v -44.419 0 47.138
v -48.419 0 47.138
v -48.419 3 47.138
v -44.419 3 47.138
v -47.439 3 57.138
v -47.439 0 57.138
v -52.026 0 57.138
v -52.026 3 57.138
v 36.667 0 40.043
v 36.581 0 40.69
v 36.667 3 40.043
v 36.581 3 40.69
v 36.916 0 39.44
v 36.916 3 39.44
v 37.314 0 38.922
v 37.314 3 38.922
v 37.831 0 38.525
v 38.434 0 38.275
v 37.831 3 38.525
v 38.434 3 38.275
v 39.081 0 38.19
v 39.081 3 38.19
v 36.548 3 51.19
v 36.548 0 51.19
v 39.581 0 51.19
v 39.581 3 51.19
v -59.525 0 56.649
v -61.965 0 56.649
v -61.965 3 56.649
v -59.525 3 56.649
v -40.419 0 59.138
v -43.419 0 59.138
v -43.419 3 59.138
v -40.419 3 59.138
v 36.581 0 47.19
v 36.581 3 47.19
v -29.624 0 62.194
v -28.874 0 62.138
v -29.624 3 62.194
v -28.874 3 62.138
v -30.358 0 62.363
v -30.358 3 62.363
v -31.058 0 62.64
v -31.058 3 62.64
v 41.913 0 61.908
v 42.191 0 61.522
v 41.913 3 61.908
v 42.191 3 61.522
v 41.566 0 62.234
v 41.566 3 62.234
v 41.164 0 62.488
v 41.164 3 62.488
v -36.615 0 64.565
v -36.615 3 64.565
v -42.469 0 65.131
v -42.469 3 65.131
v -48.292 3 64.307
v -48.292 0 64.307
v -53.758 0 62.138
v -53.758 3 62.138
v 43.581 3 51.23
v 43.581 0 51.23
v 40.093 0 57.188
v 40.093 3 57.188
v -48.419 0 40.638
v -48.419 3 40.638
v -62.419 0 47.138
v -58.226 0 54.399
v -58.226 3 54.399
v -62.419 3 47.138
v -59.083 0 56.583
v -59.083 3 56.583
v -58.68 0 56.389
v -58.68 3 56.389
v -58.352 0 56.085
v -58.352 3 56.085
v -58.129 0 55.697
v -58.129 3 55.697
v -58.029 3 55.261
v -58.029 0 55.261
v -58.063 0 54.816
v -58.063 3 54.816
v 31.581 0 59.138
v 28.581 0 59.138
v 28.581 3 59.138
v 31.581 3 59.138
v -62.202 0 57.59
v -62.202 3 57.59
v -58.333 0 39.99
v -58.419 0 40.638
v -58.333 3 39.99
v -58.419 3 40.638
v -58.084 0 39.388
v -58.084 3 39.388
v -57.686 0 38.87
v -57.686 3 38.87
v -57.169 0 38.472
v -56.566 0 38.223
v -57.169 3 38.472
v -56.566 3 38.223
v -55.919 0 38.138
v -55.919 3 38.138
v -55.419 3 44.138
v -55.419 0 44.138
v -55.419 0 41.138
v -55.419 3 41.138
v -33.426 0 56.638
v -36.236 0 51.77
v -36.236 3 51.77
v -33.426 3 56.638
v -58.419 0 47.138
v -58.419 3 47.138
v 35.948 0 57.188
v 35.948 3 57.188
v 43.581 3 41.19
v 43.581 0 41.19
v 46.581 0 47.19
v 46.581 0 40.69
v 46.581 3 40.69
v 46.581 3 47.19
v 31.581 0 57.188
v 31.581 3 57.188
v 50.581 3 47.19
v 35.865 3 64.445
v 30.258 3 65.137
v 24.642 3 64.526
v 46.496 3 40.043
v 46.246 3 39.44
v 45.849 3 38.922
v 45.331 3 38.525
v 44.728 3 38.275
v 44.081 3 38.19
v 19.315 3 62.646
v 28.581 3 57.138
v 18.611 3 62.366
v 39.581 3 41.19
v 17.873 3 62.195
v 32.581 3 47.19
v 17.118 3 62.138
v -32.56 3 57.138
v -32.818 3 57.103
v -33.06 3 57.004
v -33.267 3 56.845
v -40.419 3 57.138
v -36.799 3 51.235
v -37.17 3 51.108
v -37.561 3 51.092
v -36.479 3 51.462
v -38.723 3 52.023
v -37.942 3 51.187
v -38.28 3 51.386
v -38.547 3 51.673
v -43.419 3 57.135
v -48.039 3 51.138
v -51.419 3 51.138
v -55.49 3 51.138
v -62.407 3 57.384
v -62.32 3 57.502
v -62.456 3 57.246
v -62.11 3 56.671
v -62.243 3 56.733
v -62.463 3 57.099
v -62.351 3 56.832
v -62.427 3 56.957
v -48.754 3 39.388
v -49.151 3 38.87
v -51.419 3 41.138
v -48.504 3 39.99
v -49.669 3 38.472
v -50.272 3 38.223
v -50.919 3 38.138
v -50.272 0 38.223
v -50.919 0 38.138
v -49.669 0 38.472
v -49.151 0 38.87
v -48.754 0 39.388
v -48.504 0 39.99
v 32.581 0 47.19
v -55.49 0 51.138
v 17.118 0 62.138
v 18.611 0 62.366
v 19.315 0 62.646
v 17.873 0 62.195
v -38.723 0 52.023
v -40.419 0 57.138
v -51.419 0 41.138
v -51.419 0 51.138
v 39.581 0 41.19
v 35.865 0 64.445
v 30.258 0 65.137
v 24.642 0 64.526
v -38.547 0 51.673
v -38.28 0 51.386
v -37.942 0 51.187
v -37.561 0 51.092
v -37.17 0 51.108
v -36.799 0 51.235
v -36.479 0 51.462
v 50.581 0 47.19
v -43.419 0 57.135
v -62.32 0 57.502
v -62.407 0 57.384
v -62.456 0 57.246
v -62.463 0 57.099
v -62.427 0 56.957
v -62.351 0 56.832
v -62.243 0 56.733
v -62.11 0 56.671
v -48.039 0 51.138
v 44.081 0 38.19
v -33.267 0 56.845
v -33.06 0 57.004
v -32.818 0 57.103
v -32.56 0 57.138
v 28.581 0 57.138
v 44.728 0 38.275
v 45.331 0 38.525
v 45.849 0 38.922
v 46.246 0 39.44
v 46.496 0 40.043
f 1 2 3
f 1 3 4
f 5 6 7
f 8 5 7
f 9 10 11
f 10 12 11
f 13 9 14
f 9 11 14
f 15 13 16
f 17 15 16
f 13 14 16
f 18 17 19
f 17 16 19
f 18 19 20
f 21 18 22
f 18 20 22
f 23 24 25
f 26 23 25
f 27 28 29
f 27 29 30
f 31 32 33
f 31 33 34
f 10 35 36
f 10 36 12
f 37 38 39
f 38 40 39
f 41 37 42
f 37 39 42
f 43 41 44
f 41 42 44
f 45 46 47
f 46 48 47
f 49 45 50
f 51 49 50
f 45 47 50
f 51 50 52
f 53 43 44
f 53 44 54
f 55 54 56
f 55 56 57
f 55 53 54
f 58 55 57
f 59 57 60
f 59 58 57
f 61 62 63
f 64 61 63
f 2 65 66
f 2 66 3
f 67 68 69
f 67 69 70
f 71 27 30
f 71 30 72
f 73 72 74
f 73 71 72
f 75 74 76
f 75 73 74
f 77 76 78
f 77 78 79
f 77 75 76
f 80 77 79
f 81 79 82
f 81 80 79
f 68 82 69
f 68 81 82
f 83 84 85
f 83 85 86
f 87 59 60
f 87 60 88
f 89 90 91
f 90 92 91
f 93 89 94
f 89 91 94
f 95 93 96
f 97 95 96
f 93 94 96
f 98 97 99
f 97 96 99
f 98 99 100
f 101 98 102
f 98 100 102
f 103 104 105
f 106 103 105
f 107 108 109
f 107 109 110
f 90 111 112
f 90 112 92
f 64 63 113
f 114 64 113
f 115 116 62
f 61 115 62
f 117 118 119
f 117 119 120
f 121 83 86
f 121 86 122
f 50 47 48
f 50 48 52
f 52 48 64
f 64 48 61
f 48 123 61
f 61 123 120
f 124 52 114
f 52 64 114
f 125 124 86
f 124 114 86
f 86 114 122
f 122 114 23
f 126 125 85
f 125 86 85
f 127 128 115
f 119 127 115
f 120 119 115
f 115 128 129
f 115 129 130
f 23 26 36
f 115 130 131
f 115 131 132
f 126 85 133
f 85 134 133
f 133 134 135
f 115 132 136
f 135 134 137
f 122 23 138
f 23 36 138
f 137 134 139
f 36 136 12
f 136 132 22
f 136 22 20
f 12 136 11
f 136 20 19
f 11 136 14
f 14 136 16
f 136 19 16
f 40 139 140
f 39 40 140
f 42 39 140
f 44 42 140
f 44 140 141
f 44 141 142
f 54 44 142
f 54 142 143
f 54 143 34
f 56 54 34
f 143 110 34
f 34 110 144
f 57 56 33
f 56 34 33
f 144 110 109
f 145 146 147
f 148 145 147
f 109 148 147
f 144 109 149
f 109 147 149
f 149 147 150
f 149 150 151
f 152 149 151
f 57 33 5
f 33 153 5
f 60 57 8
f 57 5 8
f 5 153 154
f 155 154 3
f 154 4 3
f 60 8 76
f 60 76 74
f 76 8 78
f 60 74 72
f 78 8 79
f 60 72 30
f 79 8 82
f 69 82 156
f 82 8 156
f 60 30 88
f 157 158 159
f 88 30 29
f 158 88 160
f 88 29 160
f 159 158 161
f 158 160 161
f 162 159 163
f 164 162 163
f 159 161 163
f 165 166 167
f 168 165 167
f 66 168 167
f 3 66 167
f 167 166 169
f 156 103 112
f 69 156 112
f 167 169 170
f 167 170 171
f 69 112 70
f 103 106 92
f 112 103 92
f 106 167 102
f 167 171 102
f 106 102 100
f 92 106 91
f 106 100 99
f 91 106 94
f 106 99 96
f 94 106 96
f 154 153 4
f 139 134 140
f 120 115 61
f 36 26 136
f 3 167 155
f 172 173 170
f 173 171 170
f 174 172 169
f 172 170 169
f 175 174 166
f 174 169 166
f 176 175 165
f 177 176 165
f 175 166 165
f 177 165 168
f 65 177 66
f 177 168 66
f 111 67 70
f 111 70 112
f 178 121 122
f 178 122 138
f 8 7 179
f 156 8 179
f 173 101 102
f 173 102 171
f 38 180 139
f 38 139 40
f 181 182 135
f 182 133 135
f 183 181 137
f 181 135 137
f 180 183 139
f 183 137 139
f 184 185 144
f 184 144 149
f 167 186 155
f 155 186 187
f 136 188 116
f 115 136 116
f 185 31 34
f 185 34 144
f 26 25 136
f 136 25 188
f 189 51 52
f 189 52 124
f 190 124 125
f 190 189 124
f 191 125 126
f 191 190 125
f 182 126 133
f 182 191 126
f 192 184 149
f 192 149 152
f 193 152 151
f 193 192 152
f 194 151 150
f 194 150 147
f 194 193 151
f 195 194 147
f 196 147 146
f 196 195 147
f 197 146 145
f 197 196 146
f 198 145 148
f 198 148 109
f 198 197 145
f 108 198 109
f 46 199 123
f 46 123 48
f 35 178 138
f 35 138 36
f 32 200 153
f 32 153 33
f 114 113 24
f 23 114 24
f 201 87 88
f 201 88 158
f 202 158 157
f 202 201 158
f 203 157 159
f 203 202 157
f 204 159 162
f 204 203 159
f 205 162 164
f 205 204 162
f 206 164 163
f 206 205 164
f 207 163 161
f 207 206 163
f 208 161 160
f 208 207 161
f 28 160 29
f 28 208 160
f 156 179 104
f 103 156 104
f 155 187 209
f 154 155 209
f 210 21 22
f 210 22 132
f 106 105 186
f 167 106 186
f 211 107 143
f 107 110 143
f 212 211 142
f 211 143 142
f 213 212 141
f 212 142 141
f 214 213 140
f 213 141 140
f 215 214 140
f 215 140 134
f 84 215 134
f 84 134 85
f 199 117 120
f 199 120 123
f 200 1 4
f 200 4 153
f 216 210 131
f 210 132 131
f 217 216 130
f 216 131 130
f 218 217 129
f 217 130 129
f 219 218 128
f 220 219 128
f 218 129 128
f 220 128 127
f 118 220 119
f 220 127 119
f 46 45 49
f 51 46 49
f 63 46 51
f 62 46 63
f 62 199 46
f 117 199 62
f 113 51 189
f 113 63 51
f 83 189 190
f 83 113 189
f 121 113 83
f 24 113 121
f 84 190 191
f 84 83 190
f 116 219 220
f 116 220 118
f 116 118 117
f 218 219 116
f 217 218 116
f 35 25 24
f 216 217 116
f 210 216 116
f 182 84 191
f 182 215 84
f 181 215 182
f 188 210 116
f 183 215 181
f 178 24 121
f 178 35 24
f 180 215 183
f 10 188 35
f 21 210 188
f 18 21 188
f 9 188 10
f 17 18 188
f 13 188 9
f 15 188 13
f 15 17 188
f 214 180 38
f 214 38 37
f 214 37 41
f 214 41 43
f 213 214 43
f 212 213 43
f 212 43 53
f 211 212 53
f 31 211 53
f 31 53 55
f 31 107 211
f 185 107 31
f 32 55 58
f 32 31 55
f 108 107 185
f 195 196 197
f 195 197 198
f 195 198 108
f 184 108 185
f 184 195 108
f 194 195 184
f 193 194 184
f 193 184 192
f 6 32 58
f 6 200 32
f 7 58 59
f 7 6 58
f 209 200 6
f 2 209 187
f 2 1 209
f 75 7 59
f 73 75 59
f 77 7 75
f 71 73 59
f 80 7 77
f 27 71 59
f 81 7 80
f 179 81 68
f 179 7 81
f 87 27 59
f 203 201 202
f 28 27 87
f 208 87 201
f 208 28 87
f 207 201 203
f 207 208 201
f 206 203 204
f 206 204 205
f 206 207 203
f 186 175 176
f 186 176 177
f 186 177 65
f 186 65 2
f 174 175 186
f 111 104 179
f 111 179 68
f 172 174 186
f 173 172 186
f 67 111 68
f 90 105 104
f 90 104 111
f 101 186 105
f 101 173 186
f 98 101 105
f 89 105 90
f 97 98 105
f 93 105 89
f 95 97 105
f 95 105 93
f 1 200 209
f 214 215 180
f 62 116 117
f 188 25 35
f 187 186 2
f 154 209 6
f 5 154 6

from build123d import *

# Parameters (mm, degrees)
BOSS_EXTRUDE1_DEPTH = 3
FILLET2_R           = 2.5
FILLET3_R           = 1
FILLET5_R           = 2.5
FILLET6_R           = 5


with BuildPart() as part:
    # Sketch1 → Boss-Extrude1 (new body)
    with BuildSketch(Plane(origin=(0, 0, 0), x_dir=(1, 0, 0), z_dir=(0, 1, 0))):
        with BuildLine():
            Line((-62.418566214, -47.137504987), (-58.418566214, -47.137504987))
            Line((-58.418566214, -47.137504987), (-58.418566214, -38.137504987))
            Line((-58.418566214, -38.137504987), (-48.418566214, -38.137504987))
            Line((-48.418566214, -38.137504987), (-48.418566214, -47.137504987))
            Line((-48.418566214, -47.137504987), (-44.418566214, -47.137504987))
            Line((-44.418566214, -47.137504987), (-43.418817081, -57.134996312))
            Line((-43.418817081, -57.134996312), (-43.418817081, -59.137504987))
            Line((-43.418817081, -59.137504987), (-40.418817081, -59.137504987))
            Line((-40.418817081, -59.137504987), (-40.418817081, -57.137504987))
            Line((-40.418817081, -57.137504987), (-38.722684913, -52.023499684))
            ThreePointArc((-38.722684913, -52.023499684), (-37.561438496, -51.091888176), (-36.235977812, -51.769787298))
            Line((-36.235977812, -51.769787298), (-33.13692456, -57.137504987))
            Line((-33.13692456, -57.137504987), (28.581433786, -57.137504987))
            Line((28.581433786, -57.137504987), (28.581433786, -59.137504987))
            Line((28.581433786, -59.137504987), (31.581433786, -59.137504987))
            Line((31.581433786, -59.137504987), (31.581433786, -57.187643384))
            Line((31.581433786, -57.187643384), (32.581433786, -47.190177149))
            Line((32.581433786, -47.190177149), (36.581433786, -47.190177149))
            Line((36.581433786, -47.190177149), (36.581433786, -38.190177149))
            Line((36.581433786, -38.190177149), (46.581433786, -38.190177149))
            Line((46.581433786, -38.190177149), (46.581433786, -47.190177149))
            Line((46.581433786, -47.190177149), (50.581433786, -47.190177149))
            Line((50.581433786, -47.190177149), (41.830582941, -62.137504987))
            ThreePointArc((41.830582941, -62.137504987), (30.081433786, -65.137504987), (18.332284631, -62.137504987))
            Line((18.332284631, -62.137504987), (-30.079321987, -62.137504987))
            ThreePointArc((-30.079321987, -62.137504987), (-41.918817081, -65.137504987), (-53.758312176, -62.137504987))
            Line((-53.758312176, -62.137504987), (-62.202371167, -57.589552191))
            ThreePointArc((-62.202371167, -57.589552191), (-62.450096964, -57.027082233), (-61.965274707, -56.649341709))
            Line((-61.965274707, -56.649341709), (-59.524980934, -56.649341709))
            ThreePointArc((-59.524980934, -56.649341709), (-58.225942828, -55.899341709), (-58.225942828, -54.399341709))
            Line((-58.225942828, -54.399341709), (-62.418566214, -47.137504987))
        make_face()
        Polygon((36.547763078, -51.190177149), (39.581433786, -51.190177149), (39.581433786, -44.190177149), (39.581433786, -41.190177149), (43.581433786, -41.190177149), (43.581433786, -44.22970007), (43.581433786, -51.22970007), (40.093380681, -57.187643384), (35.947864455, -57.187643384), align=None, mode=Mode.SUBTRACT)
        Polygon((-55.418566214, -41.137504987), (-51.418566214, -41.137504987), (-51.418566214, -44.137504987), (-51.418566214, -51.137504987), (-48.038516462, -51.137504987), (-47.438516462, -57.137504987), (-52.026261368, -57.137504987), (-55.490362984, -51.137504987), (-55.418566214, -44.137873195), align=None, mode=Mode.SUBTRACT)
    extrude(amount=BOSS_EXTRUDE1_DEPTH)

    # Fillet2
    fillet2_edges = [part.edges().sort_by_distance(p)[0] for p in [
        (-58.418566214, 1.5, 38.137504987),
        (-48.418566214, 1.5, 38.137504987),
        (36.581433786, 1.5, 38.190177149),
        (46.581433786, 1.5, 38.190177149),
    ]]
    fillet(fillet2_edges, radius=FILLET2_R)

    # Fillet3
    fillet3_edges = [part.edges().sort_by_distance(p)[0] for p in [
        (-33.13692456, 1.5, 57.137504987),
    ]]
    fillet(fillet3_edges, radius=FILLET3_R)

    # Fillet5
    fillet5_edges = [part.edges().sort_by_distance(p)[0] for p in [
        (41.830582941, 1.5, 62.137504987),
        (-53.758312176, 1.5, 62.137504987),
    ]]
    fillet(fillet5_edges, radius=FILLET5_R)

    # Fillet6
    fillet6_edges = [part.edges().sort_by_distance(p)[0] for p in [
        (18.332284631, 1.5, 62.137504987),
        (-30.079321987, 1.5, 62.137504987),
    ]]
    fillet(fillet6_edges, radius=FILLET6_R)


solid = part.part
